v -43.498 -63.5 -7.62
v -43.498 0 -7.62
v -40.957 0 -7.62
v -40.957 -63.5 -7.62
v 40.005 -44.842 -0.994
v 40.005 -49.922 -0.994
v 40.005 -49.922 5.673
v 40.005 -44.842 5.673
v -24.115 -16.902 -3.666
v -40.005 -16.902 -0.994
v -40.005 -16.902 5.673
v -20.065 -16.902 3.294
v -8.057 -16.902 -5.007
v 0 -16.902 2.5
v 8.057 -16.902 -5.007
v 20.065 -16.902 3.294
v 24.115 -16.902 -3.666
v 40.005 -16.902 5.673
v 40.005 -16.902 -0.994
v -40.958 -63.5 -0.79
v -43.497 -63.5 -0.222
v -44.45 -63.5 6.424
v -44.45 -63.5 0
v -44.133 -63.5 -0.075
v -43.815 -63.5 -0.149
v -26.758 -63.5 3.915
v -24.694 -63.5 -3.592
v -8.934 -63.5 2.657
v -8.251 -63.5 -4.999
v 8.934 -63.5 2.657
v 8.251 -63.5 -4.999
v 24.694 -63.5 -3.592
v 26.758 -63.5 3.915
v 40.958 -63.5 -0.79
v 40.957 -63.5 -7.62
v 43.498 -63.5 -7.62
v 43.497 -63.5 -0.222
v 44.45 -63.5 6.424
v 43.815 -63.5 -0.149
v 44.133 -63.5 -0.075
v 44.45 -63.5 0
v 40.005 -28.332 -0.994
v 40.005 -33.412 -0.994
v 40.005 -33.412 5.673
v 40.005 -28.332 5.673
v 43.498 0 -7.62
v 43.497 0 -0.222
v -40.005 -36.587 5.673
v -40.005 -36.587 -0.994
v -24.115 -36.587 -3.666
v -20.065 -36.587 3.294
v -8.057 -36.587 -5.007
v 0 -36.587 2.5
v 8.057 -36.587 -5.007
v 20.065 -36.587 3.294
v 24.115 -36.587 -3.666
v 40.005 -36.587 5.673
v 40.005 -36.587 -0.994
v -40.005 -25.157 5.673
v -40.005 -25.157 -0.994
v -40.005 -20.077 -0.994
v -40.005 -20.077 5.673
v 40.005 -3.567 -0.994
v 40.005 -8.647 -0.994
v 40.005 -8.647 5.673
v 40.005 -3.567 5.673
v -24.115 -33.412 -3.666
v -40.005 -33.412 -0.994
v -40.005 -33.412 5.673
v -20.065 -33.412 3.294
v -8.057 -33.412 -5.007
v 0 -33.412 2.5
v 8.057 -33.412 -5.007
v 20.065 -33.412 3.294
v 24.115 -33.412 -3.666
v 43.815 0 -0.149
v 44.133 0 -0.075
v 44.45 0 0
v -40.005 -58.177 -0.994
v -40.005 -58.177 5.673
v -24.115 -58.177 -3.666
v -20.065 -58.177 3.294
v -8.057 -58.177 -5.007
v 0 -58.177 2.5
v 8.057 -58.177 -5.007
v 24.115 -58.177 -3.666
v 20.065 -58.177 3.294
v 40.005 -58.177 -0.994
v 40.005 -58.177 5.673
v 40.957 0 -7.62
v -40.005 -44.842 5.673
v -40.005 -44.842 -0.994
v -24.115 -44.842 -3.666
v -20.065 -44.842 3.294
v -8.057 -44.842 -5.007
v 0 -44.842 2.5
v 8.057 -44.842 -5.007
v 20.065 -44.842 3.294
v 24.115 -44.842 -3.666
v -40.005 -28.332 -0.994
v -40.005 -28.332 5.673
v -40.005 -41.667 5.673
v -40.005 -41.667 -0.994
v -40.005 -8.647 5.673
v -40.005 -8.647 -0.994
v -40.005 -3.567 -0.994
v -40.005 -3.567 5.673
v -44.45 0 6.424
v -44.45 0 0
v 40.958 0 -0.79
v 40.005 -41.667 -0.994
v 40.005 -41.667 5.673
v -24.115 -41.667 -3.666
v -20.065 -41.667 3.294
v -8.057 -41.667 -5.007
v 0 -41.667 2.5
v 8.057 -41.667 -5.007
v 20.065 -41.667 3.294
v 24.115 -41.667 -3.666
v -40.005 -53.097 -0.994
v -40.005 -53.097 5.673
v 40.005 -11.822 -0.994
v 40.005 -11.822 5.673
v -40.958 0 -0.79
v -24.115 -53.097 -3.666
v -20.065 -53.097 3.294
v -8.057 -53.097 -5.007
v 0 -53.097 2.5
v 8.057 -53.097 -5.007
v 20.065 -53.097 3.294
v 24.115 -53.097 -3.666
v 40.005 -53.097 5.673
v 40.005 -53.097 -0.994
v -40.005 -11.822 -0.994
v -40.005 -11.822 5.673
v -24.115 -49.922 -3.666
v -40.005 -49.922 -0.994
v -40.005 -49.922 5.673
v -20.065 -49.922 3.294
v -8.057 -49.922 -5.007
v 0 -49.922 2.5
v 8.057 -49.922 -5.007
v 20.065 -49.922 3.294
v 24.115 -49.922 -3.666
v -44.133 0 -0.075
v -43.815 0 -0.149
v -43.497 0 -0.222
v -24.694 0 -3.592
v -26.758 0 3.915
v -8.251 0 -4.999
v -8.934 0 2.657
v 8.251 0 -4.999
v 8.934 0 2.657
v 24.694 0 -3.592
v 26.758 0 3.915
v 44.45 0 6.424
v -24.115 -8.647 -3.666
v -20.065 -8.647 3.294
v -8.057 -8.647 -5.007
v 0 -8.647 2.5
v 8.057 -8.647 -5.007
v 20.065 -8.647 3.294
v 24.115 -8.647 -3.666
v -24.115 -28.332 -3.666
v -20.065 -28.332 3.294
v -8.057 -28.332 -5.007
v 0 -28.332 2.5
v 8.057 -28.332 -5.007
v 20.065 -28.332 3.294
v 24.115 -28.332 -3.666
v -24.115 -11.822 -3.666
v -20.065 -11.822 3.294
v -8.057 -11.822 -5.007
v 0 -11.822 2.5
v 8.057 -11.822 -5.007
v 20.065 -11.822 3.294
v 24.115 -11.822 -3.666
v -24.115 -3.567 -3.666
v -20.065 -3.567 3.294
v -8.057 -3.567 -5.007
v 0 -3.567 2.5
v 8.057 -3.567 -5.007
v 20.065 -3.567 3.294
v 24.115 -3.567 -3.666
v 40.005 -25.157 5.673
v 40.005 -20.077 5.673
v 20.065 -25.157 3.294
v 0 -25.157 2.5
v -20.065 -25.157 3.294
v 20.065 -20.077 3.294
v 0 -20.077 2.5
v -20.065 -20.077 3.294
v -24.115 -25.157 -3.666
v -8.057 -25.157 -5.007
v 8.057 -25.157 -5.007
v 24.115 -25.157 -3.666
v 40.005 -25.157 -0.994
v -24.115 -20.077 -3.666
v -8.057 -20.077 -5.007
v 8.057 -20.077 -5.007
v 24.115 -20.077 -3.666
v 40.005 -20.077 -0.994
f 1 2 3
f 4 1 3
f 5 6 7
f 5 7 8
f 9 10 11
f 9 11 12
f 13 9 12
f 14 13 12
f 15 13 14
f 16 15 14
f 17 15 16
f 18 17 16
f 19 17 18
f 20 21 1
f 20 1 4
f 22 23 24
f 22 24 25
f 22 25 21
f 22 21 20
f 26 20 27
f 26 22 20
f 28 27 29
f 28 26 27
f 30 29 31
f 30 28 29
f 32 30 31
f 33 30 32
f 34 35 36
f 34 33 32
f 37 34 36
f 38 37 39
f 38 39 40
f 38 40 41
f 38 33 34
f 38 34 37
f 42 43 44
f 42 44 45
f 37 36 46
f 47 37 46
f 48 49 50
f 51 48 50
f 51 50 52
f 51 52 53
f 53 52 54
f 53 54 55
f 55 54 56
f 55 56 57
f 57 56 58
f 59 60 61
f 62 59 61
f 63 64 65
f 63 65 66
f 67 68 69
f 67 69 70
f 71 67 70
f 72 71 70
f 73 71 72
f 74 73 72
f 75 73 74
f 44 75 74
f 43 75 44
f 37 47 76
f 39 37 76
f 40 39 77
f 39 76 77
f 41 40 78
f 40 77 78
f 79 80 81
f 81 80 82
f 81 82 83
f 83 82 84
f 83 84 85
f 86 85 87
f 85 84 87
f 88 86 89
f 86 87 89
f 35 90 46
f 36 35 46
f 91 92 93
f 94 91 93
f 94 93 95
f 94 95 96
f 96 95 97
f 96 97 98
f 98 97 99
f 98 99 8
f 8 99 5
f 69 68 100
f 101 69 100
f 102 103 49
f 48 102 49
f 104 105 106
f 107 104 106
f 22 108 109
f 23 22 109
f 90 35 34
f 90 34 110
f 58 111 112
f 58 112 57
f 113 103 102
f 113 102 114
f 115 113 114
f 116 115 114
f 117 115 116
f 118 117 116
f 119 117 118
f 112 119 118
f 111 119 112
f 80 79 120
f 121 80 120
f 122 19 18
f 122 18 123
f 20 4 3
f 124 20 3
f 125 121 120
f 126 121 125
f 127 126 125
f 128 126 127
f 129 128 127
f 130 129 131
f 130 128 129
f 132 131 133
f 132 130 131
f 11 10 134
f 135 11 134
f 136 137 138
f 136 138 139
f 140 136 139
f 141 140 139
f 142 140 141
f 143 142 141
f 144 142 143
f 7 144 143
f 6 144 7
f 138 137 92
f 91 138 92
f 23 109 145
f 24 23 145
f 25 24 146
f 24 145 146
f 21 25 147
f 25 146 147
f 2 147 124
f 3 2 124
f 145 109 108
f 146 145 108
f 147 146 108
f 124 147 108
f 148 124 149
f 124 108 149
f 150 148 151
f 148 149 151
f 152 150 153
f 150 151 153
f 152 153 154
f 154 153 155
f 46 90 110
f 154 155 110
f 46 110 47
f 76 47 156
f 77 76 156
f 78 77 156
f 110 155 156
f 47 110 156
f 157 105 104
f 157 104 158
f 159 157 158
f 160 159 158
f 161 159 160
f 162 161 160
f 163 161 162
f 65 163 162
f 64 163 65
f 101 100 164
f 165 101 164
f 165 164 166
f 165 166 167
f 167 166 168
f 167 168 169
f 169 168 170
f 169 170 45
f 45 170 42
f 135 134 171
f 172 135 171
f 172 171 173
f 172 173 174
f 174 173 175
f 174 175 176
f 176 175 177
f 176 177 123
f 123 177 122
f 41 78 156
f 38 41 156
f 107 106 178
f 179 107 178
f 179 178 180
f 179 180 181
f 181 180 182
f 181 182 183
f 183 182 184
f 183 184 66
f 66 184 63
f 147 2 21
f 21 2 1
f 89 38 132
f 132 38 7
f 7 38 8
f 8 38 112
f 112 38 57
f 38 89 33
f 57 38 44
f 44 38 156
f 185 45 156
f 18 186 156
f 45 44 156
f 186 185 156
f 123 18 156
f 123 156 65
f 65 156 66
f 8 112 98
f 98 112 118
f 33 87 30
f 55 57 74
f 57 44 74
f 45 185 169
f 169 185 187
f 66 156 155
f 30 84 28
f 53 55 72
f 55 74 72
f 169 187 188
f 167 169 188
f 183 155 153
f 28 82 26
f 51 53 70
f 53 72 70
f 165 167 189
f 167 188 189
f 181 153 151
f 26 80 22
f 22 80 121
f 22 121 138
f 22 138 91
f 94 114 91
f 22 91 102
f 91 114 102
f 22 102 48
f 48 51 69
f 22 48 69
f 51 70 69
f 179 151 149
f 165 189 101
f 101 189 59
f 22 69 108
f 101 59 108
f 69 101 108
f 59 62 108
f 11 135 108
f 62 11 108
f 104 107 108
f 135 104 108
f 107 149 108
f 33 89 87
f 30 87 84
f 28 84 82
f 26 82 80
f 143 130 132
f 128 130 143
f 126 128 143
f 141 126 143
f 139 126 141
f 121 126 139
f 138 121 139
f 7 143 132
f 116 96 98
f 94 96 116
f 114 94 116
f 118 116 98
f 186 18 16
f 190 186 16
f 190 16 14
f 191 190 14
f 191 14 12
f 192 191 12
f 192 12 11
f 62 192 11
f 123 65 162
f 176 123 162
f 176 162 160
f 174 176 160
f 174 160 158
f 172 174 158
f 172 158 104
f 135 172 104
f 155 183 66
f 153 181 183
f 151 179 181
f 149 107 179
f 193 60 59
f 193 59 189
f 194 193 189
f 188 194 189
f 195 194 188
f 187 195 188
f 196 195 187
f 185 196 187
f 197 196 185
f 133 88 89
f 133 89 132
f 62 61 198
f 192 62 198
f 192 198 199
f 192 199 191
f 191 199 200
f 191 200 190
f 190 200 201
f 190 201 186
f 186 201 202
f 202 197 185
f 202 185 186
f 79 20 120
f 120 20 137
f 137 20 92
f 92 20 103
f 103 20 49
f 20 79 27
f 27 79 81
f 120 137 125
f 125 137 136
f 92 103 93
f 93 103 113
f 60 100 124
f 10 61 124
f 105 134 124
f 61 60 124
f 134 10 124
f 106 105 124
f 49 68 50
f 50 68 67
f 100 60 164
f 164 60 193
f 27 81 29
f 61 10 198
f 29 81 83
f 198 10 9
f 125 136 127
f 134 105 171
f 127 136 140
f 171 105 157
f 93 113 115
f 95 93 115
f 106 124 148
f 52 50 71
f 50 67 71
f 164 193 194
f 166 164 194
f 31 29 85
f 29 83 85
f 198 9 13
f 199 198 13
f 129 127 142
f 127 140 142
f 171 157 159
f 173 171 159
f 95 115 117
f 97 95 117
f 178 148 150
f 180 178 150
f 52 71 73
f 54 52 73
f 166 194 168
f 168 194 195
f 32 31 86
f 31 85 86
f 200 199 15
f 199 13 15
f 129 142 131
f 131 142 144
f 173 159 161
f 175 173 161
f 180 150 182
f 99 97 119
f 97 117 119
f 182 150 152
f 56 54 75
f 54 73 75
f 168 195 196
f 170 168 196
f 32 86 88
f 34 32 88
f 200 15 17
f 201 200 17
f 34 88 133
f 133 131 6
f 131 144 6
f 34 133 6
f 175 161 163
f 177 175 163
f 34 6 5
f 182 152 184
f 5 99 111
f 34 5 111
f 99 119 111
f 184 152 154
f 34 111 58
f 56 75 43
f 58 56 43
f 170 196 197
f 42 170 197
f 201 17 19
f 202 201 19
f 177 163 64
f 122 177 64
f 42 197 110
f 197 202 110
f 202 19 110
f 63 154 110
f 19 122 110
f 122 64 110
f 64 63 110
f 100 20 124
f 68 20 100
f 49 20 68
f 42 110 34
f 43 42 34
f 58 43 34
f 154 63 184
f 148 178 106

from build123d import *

# Parameters (mm, degrees)
F1_DEPTH = 63.5
F2_W     = 80.01
F2_H     = 5.08
F3_DEPTH = 25.4
F5_W     = 2.54
F5_H     = 58.1769375229
F5_H_2   = 5.3230624771
F5_H_3   = 63.5


with BuildPart() as f1:
    # F0 (on Front) → F1 (new body)
    with BuildSketch(Plane.XZ):
        with BuildLine():
            Line((44.45, 0), (44.45, 6.4237275764))
            ThreePointArc((44.45, 6.4237275764), (0, 2.4996446645), (-44.45, 6.4237275764))
            Line((-44.45, 6.4237275764), (-44.45, 0))
            ThreePointArc((-44.45, 0), (0, -5.1746531634), (44.45, 0))
        make_face()
    extrude(amount=F1_DEPTH)

    # F2 (on Top) → F3 (cut, symmetric)
    with BuildSketch(Plane.XY):
        with Locations((0, -6.1069375229)):
            Rectangle(F2_W, F2_H)
        with Locations((0, -14.3619375229)):
            Rectangle(F2_W, F2_H)
        with Locations((0, -22.6169375229)):
            Rectangle(F2_W, F2_H)
        with Locations((0, -30.8719375229)):
            Rectangle(F2_W, F2_H)
        with Locations((0, -39.1269375229)):
            Rectangle(F2_W, F2_H)
        with Locations((0, -47.3819375229)):
            Rectangle(F2_W, F2_H)
        with Locations((0, -55.6369375229)):
            Rectangle(F2_W, F2_H)
    extrude(amount=F3_DEPTH, both=True, mode=Mode.SUBTRACT)

    # F5 (on offset) → F6 (join, up to the next surface of F1)
    with BuildSketch(Plane.XY.offset(-7.62)):
        with Locations((-42.2275, -29.0884687615)):
            Rectangle(F5_W, F5_H)
        with Locations((-42.2275, -60.8384687615)):
            Rectangle(F5_W, F5_H_2)
        with Locations((42.2275, -31.75)):
            Rectangle(F5_W, F5_H_3)
    extrude(until=Until.NEXT)


solid = f1.part
